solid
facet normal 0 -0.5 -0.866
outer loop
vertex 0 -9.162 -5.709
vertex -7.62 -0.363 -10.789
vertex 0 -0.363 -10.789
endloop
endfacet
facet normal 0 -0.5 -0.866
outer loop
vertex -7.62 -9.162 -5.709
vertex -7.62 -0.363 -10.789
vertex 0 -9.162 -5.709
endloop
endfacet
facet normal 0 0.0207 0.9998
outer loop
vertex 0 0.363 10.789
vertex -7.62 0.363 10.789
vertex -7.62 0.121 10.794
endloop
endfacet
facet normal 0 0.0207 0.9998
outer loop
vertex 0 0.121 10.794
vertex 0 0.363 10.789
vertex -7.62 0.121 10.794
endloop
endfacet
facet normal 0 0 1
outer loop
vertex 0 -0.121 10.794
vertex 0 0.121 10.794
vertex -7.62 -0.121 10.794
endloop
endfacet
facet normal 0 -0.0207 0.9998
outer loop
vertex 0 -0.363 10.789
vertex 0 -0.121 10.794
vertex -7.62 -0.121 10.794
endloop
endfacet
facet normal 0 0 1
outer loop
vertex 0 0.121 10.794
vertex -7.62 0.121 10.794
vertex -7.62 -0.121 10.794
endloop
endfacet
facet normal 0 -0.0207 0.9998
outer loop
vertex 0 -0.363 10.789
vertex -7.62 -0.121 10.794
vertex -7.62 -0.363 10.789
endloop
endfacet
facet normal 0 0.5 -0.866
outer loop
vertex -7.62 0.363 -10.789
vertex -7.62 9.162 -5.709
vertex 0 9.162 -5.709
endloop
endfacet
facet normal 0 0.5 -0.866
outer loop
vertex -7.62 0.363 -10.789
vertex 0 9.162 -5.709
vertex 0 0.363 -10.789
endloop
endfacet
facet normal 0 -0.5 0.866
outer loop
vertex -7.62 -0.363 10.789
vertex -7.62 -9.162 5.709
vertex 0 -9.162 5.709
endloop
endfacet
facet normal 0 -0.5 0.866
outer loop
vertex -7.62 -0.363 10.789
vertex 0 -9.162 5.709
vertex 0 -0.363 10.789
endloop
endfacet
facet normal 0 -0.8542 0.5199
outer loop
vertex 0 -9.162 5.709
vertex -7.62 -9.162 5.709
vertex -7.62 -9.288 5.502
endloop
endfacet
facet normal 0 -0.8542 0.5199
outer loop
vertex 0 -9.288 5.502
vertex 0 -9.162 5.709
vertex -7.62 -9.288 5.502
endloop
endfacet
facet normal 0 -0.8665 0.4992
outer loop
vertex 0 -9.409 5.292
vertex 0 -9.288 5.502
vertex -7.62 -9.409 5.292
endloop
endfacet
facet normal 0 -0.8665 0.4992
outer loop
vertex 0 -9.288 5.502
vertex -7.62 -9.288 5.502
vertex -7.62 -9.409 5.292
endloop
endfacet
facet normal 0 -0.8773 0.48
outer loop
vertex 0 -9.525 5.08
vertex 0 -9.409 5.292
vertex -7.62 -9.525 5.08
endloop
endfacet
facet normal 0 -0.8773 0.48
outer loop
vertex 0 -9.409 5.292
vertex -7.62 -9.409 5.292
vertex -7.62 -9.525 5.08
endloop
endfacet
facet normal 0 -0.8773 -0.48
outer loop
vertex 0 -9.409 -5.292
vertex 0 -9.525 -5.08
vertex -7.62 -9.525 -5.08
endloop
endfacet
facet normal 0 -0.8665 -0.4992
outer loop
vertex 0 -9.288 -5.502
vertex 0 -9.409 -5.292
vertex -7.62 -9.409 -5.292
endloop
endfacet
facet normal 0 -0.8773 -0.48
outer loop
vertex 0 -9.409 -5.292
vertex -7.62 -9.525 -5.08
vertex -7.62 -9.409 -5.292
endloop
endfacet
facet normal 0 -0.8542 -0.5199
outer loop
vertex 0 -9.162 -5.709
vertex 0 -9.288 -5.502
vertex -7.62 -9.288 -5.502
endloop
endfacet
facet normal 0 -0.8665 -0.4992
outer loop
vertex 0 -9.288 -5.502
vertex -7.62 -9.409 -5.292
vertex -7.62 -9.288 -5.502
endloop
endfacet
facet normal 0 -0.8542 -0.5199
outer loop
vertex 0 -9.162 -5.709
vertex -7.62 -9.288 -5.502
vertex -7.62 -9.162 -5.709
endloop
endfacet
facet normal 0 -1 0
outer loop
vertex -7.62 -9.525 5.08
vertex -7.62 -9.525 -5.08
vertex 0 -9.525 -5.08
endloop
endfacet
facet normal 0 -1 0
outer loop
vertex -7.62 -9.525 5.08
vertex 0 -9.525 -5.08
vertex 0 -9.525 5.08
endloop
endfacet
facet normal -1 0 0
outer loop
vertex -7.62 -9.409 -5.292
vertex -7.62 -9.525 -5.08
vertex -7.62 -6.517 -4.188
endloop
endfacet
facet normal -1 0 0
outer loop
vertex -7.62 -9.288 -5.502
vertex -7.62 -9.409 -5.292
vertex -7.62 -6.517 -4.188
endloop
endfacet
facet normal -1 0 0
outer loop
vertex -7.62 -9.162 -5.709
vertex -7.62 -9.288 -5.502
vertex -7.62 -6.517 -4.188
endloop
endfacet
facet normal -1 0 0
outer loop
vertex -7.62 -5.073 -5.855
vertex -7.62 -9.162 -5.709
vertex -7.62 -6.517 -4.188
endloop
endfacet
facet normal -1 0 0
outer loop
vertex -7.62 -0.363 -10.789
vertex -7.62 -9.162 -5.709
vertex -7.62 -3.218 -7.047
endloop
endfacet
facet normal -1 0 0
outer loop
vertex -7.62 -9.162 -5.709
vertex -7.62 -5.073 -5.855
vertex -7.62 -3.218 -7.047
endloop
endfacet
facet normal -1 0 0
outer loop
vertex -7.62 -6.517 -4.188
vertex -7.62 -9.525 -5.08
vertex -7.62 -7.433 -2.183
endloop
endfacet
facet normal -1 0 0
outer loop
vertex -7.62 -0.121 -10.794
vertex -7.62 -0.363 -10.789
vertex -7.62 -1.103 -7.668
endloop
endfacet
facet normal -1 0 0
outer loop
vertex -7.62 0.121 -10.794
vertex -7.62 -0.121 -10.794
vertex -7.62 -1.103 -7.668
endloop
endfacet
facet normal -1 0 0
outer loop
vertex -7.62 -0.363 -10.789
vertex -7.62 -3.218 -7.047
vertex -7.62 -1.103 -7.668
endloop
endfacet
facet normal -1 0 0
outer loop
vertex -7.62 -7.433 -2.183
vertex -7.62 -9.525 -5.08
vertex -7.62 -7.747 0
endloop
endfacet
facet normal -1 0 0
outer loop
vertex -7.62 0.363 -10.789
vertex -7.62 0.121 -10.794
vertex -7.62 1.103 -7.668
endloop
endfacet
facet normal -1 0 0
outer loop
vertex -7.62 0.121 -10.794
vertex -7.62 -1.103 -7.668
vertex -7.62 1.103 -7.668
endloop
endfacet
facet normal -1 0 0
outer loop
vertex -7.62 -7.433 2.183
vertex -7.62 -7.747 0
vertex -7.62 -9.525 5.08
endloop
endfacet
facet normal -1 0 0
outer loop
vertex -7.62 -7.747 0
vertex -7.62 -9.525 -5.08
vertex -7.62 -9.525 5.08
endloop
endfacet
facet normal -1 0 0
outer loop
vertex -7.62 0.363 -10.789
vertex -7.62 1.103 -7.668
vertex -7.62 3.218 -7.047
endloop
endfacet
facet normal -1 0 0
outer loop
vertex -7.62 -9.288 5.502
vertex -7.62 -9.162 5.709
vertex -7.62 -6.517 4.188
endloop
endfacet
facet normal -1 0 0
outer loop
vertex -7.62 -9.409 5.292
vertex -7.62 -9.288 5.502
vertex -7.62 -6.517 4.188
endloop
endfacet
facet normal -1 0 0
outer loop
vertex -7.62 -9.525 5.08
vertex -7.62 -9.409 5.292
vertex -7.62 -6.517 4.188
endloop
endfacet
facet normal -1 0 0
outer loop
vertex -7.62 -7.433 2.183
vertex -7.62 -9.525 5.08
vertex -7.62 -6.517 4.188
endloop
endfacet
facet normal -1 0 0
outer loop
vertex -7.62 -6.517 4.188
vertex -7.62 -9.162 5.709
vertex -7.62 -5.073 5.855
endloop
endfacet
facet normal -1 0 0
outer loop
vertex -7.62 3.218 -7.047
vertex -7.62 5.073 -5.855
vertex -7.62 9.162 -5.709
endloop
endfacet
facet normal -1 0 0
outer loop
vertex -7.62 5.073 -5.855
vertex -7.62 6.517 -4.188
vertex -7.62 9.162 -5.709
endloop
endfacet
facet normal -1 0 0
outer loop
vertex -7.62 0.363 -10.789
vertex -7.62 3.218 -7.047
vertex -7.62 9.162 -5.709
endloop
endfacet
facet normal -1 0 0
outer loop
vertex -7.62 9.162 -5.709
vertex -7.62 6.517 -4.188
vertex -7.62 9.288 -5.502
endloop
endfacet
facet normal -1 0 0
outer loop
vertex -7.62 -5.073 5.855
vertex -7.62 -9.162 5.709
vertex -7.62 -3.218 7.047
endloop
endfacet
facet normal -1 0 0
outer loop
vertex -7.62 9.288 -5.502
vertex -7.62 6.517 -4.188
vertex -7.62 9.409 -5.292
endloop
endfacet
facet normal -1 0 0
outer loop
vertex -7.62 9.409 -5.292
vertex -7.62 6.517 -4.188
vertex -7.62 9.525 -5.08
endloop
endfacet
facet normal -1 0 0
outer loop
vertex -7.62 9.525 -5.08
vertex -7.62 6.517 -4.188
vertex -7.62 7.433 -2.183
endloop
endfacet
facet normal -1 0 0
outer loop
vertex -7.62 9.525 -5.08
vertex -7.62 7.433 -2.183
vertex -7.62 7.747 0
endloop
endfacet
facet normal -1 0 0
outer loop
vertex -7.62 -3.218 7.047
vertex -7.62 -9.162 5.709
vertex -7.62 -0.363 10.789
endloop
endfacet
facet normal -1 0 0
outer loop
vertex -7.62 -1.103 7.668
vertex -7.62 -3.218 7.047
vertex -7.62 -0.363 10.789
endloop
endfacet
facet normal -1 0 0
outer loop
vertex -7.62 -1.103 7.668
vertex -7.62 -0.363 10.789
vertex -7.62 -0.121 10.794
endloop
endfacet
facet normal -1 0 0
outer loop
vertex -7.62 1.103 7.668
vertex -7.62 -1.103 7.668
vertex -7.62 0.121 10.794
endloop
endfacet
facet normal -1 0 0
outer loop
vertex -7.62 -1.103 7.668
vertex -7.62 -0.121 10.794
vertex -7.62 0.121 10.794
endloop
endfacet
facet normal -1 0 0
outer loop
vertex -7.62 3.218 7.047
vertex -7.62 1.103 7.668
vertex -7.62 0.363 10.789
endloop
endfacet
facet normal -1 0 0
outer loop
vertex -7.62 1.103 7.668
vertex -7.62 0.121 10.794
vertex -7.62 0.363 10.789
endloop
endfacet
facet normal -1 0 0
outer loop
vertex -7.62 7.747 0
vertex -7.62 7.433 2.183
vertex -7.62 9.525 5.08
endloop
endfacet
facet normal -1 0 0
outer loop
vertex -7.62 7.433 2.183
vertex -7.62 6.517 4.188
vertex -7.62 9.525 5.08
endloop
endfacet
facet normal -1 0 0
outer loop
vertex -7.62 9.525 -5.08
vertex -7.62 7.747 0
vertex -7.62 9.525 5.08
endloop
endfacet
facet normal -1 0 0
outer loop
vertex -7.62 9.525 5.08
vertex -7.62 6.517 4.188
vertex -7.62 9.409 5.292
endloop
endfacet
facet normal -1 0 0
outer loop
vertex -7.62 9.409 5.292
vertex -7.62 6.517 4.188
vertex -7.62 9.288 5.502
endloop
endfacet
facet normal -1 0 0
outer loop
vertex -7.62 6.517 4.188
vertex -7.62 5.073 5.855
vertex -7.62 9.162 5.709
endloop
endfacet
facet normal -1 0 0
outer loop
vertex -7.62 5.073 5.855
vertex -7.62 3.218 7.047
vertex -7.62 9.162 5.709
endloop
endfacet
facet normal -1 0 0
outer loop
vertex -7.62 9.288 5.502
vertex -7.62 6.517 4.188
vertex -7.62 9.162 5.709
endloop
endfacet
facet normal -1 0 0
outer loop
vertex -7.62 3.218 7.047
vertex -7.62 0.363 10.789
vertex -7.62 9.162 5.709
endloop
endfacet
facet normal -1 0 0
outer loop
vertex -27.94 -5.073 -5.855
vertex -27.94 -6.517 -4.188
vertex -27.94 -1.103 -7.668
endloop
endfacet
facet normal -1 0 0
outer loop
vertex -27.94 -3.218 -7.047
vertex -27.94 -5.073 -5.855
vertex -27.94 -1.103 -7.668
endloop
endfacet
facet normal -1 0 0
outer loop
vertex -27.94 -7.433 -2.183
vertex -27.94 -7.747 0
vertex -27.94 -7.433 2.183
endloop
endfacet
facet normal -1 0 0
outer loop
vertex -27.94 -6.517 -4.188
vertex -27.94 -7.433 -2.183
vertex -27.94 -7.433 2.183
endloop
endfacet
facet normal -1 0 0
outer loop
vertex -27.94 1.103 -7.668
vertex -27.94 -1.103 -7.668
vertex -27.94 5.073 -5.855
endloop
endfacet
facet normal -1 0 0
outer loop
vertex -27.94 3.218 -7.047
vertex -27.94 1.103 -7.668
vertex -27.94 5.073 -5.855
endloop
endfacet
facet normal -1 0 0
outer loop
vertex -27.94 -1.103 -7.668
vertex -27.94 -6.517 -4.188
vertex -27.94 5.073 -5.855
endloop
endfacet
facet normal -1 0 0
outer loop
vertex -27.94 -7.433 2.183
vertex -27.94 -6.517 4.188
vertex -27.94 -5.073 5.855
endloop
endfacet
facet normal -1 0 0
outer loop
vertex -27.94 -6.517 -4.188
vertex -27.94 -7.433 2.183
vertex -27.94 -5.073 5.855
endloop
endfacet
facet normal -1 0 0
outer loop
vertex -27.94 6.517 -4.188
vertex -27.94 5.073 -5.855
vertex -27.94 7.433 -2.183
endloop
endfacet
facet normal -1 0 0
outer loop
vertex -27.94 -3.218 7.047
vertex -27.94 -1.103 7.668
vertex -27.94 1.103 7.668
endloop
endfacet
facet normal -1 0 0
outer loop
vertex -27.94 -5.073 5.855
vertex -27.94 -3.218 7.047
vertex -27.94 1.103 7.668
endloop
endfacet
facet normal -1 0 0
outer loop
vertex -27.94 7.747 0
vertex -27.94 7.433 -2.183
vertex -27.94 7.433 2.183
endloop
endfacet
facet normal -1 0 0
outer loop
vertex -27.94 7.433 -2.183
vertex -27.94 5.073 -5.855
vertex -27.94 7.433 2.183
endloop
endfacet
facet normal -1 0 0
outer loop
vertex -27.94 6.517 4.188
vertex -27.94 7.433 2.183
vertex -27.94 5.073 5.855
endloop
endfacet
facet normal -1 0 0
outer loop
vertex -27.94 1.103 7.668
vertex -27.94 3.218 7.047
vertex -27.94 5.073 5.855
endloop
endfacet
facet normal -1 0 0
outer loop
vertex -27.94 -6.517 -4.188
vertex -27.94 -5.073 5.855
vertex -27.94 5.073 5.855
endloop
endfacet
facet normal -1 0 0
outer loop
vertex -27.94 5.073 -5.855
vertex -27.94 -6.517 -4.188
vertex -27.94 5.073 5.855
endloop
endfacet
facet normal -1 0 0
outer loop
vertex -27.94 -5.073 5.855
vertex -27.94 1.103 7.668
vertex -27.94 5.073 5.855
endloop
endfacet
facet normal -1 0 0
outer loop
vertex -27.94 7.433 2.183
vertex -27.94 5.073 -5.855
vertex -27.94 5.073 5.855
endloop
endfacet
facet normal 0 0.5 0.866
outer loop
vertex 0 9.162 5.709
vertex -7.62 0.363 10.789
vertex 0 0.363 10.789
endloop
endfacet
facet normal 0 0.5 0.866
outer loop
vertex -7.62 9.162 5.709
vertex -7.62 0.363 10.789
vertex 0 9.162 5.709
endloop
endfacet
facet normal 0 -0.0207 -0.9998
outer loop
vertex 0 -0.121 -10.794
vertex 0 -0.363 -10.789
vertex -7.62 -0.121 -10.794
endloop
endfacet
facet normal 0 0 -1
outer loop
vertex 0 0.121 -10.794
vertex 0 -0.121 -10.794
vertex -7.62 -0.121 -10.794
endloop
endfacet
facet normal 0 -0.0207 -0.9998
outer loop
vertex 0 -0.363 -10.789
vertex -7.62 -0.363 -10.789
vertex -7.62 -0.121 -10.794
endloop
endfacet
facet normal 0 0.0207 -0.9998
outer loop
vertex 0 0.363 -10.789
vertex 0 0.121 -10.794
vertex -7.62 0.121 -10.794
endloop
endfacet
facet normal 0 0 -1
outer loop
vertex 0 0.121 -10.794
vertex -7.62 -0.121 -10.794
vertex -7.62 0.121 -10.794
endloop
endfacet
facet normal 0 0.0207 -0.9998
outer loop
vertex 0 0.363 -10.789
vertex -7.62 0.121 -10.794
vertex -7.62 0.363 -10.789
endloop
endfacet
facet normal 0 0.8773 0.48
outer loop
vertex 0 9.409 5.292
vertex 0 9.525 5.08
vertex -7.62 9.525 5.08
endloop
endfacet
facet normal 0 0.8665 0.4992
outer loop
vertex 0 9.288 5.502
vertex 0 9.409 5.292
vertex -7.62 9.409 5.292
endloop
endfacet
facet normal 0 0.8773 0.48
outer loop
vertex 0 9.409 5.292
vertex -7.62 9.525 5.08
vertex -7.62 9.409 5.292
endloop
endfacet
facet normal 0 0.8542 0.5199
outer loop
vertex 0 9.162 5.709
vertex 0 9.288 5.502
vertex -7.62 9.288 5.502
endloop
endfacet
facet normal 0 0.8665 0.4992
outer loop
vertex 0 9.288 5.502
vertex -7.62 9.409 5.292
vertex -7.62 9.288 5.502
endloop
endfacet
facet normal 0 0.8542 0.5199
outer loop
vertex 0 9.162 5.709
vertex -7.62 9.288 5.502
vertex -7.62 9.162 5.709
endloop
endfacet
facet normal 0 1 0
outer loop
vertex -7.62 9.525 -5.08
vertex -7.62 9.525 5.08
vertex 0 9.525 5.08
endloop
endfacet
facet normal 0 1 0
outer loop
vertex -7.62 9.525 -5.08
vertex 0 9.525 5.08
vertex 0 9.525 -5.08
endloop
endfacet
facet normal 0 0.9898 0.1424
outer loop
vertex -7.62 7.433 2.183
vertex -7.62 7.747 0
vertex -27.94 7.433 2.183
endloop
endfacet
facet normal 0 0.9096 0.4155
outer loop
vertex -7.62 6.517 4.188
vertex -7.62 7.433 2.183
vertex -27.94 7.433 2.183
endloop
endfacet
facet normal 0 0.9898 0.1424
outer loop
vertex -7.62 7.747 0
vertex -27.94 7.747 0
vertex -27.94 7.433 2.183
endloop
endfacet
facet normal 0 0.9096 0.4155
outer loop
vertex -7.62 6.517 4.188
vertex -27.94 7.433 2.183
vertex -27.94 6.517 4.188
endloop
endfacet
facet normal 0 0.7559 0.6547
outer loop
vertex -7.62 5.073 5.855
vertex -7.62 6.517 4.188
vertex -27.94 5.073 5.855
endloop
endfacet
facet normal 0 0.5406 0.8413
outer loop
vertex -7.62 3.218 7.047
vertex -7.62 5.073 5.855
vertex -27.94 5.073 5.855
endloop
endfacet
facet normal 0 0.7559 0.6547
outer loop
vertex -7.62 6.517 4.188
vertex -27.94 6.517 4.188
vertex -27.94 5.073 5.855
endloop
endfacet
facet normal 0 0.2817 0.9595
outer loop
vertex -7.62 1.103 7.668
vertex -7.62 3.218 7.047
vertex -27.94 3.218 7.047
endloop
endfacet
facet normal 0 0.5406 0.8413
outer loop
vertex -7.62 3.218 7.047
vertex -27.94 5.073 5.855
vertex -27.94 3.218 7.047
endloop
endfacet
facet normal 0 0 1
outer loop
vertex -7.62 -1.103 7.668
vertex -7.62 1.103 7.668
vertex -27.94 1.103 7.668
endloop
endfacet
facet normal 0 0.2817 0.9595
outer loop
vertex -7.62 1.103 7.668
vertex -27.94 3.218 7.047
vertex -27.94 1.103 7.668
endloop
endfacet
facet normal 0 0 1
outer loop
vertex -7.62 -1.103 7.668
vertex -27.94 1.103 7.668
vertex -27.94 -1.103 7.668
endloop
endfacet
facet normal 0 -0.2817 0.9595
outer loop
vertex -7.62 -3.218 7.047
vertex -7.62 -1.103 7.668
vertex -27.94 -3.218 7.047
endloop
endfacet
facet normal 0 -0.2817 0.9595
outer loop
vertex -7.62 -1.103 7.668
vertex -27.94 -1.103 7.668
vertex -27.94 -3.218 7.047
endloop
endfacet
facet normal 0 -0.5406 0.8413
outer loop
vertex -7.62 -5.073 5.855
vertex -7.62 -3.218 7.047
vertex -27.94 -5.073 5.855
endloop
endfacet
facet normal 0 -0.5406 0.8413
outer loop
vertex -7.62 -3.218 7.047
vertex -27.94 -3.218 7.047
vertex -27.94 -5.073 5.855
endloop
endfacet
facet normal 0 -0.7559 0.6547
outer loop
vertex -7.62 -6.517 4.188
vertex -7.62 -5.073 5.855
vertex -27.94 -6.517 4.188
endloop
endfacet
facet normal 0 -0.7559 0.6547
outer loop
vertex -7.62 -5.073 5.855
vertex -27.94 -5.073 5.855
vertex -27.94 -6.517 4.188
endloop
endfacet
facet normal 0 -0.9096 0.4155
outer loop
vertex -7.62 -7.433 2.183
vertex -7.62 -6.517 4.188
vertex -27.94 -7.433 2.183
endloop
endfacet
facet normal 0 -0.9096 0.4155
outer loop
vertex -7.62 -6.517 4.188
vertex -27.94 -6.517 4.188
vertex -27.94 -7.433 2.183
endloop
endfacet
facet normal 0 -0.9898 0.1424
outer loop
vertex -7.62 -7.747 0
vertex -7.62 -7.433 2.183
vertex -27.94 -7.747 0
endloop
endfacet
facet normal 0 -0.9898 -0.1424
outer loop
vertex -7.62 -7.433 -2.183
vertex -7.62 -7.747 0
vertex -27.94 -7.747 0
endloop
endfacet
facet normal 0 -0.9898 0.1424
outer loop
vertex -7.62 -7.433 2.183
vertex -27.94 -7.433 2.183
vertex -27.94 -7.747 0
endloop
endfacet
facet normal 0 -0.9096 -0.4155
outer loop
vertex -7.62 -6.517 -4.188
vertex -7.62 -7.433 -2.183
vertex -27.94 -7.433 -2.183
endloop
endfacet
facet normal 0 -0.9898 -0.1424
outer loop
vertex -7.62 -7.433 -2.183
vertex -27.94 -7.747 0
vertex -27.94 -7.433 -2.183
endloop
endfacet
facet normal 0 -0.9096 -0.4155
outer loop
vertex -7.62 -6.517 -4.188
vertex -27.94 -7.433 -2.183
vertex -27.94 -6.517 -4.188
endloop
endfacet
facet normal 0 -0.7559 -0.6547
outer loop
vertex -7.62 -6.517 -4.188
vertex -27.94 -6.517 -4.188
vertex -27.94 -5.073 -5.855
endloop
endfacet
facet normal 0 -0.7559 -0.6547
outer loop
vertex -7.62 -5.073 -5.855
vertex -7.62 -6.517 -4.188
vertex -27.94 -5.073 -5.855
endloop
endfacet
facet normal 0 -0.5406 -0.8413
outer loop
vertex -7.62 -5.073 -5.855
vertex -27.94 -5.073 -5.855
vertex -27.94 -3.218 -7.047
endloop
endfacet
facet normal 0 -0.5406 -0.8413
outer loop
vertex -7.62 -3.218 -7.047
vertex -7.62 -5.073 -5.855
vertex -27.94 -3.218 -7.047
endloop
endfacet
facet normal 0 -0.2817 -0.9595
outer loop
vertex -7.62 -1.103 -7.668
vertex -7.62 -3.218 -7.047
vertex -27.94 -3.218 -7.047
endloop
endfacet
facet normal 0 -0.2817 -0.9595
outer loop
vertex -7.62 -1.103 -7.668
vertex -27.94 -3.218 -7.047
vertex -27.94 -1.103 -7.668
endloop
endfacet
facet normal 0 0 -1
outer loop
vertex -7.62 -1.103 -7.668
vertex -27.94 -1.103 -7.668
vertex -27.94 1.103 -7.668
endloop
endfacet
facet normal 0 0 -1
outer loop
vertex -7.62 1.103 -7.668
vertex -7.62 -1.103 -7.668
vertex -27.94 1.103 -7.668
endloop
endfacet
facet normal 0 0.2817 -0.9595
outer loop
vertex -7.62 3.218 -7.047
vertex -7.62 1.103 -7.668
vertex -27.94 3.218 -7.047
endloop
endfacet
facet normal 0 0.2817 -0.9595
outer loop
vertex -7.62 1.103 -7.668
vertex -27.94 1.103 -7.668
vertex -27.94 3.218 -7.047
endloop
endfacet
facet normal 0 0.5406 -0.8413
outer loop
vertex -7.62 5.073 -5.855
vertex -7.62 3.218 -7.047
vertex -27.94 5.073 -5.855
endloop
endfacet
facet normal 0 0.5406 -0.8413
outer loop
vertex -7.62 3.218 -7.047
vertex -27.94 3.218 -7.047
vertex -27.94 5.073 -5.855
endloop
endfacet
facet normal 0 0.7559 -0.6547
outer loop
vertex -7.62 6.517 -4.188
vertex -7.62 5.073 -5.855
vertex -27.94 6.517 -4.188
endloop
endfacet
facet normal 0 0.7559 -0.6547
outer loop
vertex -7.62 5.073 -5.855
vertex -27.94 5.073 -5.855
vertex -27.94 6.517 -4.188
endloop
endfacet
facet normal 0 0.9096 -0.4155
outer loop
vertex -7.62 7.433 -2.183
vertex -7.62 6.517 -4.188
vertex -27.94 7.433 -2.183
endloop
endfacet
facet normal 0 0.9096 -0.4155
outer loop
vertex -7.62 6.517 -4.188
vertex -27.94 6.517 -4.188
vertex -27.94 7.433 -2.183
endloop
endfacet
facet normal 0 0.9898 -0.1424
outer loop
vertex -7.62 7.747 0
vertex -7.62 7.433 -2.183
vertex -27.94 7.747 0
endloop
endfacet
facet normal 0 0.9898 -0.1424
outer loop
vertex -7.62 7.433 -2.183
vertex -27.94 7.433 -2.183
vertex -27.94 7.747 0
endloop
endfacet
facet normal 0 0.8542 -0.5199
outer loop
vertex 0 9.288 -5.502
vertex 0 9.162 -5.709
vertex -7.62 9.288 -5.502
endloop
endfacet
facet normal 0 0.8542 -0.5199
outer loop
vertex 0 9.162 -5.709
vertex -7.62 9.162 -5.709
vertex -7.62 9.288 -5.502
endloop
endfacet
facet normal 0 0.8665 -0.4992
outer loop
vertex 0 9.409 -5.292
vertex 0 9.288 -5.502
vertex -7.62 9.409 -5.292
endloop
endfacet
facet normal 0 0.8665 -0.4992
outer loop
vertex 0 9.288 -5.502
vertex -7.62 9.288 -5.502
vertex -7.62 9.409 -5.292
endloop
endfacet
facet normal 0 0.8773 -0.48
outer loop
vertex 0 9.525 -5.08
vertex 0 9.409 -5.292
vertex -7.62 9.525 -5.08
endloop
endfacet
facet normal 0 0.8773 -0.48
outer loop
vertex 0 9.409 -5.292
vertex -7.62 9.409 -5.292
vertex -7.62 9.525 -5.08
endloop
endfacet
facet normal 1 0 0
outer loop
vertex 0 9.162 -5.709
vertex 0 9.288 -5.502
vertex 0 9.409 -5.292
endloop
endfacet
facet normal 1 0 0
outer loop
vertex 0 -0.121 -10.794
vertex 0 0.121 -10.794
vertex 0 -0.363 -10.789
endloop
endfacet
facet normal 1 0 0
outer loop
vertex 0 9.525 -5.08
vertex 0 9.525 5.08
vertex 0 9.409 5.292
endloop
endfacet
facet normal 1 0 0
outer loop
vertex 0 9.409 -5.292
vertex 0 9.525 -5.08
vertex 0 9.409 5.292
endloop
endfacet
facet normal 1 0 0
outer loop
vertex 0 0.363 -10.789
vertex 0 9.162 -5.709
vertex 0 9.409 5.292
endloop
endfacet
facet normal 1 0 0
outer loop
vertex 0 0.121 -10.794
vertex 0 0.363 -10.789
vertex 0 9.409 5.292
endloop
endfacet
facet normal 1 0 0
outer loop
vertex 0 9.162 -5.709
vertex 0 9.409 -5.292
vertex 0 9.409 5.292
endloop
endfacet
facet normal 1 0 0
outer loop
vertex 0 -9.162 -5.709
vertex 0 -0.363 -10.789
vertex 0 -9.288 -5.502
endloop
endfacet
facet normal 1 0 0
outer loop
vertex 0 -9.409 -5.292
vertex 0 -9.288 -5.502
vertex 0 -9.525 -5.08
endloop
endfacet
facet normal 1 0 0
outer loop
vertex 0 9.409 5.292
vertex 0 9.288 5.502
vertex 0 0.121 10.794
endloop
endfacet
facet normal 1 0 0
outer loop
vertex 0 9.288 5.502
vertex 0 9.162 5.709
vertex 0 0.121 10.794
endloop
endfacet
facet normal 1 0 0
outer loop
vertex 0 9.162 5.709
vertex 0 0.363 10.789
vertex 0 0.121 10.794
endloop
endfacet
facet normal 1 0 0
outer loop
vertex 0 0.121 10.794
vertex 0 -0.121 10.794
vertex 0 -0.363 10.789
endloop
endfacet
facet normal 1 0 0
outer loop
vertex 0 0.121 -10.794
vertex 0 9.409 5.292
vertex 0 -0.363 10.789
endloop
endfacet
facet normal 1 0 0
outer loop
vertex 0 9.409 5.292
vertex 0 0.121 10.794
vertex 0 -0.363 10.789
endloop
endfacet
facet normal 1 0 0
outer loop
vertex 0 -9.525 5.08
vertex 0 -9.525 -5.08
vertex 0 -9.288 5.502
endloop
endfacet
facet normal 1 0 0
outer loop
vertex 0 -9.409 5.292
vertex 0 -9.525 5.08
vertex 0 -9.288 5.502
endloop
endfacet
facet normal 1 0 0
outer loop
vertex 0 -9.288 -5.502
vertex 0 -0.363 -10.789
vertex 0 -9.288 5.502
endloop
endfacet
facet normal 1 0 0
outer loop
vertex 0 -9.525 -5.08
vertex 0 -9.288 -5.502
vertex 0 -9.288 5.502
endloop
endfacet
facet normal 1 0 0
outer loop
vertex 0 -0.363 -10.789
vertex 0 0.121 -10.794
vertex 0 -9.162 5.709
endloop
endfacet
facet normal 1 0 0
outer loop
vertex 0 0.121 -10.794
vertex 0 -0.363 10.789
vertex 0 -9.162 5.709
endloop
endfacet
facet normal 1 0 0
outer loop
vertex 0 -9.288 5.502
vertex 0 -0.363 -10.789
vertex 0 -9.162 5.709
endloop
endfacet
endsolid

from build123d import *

# Parameters (mm, degrees)
SKETCH2_OUTSIDE_W       = 34.798
SKETCH2_OUTSIDE_H       = 34.798
CUT_EXTRUDE1_DEPTH      = 21.32
CUT_EXTRUDE1_DEPTH_BACK = 27.67
SKETCH3_R               = 5.55625
CUT_EXTRUDE2_DEPTH      = 20.05


with BuildPart() as part:
    # Sketch1 → Revolve1 (revolve)
    with BuildSketch(Plane.XY):
        Polygon((0, 10.795), (-7.62, 10.795), (-7.62, 7.747), (-27.94, 7.747), (-27.94, 0), (19.05, 0), (19.05, 5.55625), (0, 5.55625), align=None)
    revolve(axis=Axis((-27.94, 0, 0), (1, 0, 0)))

    # Sketch2 outside → Cut-Extrude1 (cut, two sides)
    with BuildSketch(Plane.ZY.offset(7.62)) as cut_extrude1_sk:
        Rectangle(SKETCH2_OUTSIDE_W, SKETCH2_OUTSIDE_H)
        Polygon((-5.499261314, 9.525), (-10.998522628, 0), (-5.499261314, -9.525), (5.499261314, -9.525), (10.998522628, 0), (5.499261314, 9.525), align=None, mode=Mode.SUBTRACT)
    extrude(amount=CUT_EXTRUDE1_DEPTH, mode=Mode.SUBTRACT)
    extrude(cut_extrude1_sk.sketch, amount=-CUT_EXTRUDE1_DEPTH_BACK, mode=Mode.SUBTRACT)

    # Sketch3 → Cut-Extrude2 (cut, through all)
    with BuildSketch(Plane(origin=(0, 0, 0), x_dir=(0, 0, -1), z_dir=(1, 0, 0))):
        Circle(SKETCH3_R)
    extrude(amount=CUT_EXTRUDE2_DEPTH, mode=Mode.SUBTRACT)


solid = part.part
